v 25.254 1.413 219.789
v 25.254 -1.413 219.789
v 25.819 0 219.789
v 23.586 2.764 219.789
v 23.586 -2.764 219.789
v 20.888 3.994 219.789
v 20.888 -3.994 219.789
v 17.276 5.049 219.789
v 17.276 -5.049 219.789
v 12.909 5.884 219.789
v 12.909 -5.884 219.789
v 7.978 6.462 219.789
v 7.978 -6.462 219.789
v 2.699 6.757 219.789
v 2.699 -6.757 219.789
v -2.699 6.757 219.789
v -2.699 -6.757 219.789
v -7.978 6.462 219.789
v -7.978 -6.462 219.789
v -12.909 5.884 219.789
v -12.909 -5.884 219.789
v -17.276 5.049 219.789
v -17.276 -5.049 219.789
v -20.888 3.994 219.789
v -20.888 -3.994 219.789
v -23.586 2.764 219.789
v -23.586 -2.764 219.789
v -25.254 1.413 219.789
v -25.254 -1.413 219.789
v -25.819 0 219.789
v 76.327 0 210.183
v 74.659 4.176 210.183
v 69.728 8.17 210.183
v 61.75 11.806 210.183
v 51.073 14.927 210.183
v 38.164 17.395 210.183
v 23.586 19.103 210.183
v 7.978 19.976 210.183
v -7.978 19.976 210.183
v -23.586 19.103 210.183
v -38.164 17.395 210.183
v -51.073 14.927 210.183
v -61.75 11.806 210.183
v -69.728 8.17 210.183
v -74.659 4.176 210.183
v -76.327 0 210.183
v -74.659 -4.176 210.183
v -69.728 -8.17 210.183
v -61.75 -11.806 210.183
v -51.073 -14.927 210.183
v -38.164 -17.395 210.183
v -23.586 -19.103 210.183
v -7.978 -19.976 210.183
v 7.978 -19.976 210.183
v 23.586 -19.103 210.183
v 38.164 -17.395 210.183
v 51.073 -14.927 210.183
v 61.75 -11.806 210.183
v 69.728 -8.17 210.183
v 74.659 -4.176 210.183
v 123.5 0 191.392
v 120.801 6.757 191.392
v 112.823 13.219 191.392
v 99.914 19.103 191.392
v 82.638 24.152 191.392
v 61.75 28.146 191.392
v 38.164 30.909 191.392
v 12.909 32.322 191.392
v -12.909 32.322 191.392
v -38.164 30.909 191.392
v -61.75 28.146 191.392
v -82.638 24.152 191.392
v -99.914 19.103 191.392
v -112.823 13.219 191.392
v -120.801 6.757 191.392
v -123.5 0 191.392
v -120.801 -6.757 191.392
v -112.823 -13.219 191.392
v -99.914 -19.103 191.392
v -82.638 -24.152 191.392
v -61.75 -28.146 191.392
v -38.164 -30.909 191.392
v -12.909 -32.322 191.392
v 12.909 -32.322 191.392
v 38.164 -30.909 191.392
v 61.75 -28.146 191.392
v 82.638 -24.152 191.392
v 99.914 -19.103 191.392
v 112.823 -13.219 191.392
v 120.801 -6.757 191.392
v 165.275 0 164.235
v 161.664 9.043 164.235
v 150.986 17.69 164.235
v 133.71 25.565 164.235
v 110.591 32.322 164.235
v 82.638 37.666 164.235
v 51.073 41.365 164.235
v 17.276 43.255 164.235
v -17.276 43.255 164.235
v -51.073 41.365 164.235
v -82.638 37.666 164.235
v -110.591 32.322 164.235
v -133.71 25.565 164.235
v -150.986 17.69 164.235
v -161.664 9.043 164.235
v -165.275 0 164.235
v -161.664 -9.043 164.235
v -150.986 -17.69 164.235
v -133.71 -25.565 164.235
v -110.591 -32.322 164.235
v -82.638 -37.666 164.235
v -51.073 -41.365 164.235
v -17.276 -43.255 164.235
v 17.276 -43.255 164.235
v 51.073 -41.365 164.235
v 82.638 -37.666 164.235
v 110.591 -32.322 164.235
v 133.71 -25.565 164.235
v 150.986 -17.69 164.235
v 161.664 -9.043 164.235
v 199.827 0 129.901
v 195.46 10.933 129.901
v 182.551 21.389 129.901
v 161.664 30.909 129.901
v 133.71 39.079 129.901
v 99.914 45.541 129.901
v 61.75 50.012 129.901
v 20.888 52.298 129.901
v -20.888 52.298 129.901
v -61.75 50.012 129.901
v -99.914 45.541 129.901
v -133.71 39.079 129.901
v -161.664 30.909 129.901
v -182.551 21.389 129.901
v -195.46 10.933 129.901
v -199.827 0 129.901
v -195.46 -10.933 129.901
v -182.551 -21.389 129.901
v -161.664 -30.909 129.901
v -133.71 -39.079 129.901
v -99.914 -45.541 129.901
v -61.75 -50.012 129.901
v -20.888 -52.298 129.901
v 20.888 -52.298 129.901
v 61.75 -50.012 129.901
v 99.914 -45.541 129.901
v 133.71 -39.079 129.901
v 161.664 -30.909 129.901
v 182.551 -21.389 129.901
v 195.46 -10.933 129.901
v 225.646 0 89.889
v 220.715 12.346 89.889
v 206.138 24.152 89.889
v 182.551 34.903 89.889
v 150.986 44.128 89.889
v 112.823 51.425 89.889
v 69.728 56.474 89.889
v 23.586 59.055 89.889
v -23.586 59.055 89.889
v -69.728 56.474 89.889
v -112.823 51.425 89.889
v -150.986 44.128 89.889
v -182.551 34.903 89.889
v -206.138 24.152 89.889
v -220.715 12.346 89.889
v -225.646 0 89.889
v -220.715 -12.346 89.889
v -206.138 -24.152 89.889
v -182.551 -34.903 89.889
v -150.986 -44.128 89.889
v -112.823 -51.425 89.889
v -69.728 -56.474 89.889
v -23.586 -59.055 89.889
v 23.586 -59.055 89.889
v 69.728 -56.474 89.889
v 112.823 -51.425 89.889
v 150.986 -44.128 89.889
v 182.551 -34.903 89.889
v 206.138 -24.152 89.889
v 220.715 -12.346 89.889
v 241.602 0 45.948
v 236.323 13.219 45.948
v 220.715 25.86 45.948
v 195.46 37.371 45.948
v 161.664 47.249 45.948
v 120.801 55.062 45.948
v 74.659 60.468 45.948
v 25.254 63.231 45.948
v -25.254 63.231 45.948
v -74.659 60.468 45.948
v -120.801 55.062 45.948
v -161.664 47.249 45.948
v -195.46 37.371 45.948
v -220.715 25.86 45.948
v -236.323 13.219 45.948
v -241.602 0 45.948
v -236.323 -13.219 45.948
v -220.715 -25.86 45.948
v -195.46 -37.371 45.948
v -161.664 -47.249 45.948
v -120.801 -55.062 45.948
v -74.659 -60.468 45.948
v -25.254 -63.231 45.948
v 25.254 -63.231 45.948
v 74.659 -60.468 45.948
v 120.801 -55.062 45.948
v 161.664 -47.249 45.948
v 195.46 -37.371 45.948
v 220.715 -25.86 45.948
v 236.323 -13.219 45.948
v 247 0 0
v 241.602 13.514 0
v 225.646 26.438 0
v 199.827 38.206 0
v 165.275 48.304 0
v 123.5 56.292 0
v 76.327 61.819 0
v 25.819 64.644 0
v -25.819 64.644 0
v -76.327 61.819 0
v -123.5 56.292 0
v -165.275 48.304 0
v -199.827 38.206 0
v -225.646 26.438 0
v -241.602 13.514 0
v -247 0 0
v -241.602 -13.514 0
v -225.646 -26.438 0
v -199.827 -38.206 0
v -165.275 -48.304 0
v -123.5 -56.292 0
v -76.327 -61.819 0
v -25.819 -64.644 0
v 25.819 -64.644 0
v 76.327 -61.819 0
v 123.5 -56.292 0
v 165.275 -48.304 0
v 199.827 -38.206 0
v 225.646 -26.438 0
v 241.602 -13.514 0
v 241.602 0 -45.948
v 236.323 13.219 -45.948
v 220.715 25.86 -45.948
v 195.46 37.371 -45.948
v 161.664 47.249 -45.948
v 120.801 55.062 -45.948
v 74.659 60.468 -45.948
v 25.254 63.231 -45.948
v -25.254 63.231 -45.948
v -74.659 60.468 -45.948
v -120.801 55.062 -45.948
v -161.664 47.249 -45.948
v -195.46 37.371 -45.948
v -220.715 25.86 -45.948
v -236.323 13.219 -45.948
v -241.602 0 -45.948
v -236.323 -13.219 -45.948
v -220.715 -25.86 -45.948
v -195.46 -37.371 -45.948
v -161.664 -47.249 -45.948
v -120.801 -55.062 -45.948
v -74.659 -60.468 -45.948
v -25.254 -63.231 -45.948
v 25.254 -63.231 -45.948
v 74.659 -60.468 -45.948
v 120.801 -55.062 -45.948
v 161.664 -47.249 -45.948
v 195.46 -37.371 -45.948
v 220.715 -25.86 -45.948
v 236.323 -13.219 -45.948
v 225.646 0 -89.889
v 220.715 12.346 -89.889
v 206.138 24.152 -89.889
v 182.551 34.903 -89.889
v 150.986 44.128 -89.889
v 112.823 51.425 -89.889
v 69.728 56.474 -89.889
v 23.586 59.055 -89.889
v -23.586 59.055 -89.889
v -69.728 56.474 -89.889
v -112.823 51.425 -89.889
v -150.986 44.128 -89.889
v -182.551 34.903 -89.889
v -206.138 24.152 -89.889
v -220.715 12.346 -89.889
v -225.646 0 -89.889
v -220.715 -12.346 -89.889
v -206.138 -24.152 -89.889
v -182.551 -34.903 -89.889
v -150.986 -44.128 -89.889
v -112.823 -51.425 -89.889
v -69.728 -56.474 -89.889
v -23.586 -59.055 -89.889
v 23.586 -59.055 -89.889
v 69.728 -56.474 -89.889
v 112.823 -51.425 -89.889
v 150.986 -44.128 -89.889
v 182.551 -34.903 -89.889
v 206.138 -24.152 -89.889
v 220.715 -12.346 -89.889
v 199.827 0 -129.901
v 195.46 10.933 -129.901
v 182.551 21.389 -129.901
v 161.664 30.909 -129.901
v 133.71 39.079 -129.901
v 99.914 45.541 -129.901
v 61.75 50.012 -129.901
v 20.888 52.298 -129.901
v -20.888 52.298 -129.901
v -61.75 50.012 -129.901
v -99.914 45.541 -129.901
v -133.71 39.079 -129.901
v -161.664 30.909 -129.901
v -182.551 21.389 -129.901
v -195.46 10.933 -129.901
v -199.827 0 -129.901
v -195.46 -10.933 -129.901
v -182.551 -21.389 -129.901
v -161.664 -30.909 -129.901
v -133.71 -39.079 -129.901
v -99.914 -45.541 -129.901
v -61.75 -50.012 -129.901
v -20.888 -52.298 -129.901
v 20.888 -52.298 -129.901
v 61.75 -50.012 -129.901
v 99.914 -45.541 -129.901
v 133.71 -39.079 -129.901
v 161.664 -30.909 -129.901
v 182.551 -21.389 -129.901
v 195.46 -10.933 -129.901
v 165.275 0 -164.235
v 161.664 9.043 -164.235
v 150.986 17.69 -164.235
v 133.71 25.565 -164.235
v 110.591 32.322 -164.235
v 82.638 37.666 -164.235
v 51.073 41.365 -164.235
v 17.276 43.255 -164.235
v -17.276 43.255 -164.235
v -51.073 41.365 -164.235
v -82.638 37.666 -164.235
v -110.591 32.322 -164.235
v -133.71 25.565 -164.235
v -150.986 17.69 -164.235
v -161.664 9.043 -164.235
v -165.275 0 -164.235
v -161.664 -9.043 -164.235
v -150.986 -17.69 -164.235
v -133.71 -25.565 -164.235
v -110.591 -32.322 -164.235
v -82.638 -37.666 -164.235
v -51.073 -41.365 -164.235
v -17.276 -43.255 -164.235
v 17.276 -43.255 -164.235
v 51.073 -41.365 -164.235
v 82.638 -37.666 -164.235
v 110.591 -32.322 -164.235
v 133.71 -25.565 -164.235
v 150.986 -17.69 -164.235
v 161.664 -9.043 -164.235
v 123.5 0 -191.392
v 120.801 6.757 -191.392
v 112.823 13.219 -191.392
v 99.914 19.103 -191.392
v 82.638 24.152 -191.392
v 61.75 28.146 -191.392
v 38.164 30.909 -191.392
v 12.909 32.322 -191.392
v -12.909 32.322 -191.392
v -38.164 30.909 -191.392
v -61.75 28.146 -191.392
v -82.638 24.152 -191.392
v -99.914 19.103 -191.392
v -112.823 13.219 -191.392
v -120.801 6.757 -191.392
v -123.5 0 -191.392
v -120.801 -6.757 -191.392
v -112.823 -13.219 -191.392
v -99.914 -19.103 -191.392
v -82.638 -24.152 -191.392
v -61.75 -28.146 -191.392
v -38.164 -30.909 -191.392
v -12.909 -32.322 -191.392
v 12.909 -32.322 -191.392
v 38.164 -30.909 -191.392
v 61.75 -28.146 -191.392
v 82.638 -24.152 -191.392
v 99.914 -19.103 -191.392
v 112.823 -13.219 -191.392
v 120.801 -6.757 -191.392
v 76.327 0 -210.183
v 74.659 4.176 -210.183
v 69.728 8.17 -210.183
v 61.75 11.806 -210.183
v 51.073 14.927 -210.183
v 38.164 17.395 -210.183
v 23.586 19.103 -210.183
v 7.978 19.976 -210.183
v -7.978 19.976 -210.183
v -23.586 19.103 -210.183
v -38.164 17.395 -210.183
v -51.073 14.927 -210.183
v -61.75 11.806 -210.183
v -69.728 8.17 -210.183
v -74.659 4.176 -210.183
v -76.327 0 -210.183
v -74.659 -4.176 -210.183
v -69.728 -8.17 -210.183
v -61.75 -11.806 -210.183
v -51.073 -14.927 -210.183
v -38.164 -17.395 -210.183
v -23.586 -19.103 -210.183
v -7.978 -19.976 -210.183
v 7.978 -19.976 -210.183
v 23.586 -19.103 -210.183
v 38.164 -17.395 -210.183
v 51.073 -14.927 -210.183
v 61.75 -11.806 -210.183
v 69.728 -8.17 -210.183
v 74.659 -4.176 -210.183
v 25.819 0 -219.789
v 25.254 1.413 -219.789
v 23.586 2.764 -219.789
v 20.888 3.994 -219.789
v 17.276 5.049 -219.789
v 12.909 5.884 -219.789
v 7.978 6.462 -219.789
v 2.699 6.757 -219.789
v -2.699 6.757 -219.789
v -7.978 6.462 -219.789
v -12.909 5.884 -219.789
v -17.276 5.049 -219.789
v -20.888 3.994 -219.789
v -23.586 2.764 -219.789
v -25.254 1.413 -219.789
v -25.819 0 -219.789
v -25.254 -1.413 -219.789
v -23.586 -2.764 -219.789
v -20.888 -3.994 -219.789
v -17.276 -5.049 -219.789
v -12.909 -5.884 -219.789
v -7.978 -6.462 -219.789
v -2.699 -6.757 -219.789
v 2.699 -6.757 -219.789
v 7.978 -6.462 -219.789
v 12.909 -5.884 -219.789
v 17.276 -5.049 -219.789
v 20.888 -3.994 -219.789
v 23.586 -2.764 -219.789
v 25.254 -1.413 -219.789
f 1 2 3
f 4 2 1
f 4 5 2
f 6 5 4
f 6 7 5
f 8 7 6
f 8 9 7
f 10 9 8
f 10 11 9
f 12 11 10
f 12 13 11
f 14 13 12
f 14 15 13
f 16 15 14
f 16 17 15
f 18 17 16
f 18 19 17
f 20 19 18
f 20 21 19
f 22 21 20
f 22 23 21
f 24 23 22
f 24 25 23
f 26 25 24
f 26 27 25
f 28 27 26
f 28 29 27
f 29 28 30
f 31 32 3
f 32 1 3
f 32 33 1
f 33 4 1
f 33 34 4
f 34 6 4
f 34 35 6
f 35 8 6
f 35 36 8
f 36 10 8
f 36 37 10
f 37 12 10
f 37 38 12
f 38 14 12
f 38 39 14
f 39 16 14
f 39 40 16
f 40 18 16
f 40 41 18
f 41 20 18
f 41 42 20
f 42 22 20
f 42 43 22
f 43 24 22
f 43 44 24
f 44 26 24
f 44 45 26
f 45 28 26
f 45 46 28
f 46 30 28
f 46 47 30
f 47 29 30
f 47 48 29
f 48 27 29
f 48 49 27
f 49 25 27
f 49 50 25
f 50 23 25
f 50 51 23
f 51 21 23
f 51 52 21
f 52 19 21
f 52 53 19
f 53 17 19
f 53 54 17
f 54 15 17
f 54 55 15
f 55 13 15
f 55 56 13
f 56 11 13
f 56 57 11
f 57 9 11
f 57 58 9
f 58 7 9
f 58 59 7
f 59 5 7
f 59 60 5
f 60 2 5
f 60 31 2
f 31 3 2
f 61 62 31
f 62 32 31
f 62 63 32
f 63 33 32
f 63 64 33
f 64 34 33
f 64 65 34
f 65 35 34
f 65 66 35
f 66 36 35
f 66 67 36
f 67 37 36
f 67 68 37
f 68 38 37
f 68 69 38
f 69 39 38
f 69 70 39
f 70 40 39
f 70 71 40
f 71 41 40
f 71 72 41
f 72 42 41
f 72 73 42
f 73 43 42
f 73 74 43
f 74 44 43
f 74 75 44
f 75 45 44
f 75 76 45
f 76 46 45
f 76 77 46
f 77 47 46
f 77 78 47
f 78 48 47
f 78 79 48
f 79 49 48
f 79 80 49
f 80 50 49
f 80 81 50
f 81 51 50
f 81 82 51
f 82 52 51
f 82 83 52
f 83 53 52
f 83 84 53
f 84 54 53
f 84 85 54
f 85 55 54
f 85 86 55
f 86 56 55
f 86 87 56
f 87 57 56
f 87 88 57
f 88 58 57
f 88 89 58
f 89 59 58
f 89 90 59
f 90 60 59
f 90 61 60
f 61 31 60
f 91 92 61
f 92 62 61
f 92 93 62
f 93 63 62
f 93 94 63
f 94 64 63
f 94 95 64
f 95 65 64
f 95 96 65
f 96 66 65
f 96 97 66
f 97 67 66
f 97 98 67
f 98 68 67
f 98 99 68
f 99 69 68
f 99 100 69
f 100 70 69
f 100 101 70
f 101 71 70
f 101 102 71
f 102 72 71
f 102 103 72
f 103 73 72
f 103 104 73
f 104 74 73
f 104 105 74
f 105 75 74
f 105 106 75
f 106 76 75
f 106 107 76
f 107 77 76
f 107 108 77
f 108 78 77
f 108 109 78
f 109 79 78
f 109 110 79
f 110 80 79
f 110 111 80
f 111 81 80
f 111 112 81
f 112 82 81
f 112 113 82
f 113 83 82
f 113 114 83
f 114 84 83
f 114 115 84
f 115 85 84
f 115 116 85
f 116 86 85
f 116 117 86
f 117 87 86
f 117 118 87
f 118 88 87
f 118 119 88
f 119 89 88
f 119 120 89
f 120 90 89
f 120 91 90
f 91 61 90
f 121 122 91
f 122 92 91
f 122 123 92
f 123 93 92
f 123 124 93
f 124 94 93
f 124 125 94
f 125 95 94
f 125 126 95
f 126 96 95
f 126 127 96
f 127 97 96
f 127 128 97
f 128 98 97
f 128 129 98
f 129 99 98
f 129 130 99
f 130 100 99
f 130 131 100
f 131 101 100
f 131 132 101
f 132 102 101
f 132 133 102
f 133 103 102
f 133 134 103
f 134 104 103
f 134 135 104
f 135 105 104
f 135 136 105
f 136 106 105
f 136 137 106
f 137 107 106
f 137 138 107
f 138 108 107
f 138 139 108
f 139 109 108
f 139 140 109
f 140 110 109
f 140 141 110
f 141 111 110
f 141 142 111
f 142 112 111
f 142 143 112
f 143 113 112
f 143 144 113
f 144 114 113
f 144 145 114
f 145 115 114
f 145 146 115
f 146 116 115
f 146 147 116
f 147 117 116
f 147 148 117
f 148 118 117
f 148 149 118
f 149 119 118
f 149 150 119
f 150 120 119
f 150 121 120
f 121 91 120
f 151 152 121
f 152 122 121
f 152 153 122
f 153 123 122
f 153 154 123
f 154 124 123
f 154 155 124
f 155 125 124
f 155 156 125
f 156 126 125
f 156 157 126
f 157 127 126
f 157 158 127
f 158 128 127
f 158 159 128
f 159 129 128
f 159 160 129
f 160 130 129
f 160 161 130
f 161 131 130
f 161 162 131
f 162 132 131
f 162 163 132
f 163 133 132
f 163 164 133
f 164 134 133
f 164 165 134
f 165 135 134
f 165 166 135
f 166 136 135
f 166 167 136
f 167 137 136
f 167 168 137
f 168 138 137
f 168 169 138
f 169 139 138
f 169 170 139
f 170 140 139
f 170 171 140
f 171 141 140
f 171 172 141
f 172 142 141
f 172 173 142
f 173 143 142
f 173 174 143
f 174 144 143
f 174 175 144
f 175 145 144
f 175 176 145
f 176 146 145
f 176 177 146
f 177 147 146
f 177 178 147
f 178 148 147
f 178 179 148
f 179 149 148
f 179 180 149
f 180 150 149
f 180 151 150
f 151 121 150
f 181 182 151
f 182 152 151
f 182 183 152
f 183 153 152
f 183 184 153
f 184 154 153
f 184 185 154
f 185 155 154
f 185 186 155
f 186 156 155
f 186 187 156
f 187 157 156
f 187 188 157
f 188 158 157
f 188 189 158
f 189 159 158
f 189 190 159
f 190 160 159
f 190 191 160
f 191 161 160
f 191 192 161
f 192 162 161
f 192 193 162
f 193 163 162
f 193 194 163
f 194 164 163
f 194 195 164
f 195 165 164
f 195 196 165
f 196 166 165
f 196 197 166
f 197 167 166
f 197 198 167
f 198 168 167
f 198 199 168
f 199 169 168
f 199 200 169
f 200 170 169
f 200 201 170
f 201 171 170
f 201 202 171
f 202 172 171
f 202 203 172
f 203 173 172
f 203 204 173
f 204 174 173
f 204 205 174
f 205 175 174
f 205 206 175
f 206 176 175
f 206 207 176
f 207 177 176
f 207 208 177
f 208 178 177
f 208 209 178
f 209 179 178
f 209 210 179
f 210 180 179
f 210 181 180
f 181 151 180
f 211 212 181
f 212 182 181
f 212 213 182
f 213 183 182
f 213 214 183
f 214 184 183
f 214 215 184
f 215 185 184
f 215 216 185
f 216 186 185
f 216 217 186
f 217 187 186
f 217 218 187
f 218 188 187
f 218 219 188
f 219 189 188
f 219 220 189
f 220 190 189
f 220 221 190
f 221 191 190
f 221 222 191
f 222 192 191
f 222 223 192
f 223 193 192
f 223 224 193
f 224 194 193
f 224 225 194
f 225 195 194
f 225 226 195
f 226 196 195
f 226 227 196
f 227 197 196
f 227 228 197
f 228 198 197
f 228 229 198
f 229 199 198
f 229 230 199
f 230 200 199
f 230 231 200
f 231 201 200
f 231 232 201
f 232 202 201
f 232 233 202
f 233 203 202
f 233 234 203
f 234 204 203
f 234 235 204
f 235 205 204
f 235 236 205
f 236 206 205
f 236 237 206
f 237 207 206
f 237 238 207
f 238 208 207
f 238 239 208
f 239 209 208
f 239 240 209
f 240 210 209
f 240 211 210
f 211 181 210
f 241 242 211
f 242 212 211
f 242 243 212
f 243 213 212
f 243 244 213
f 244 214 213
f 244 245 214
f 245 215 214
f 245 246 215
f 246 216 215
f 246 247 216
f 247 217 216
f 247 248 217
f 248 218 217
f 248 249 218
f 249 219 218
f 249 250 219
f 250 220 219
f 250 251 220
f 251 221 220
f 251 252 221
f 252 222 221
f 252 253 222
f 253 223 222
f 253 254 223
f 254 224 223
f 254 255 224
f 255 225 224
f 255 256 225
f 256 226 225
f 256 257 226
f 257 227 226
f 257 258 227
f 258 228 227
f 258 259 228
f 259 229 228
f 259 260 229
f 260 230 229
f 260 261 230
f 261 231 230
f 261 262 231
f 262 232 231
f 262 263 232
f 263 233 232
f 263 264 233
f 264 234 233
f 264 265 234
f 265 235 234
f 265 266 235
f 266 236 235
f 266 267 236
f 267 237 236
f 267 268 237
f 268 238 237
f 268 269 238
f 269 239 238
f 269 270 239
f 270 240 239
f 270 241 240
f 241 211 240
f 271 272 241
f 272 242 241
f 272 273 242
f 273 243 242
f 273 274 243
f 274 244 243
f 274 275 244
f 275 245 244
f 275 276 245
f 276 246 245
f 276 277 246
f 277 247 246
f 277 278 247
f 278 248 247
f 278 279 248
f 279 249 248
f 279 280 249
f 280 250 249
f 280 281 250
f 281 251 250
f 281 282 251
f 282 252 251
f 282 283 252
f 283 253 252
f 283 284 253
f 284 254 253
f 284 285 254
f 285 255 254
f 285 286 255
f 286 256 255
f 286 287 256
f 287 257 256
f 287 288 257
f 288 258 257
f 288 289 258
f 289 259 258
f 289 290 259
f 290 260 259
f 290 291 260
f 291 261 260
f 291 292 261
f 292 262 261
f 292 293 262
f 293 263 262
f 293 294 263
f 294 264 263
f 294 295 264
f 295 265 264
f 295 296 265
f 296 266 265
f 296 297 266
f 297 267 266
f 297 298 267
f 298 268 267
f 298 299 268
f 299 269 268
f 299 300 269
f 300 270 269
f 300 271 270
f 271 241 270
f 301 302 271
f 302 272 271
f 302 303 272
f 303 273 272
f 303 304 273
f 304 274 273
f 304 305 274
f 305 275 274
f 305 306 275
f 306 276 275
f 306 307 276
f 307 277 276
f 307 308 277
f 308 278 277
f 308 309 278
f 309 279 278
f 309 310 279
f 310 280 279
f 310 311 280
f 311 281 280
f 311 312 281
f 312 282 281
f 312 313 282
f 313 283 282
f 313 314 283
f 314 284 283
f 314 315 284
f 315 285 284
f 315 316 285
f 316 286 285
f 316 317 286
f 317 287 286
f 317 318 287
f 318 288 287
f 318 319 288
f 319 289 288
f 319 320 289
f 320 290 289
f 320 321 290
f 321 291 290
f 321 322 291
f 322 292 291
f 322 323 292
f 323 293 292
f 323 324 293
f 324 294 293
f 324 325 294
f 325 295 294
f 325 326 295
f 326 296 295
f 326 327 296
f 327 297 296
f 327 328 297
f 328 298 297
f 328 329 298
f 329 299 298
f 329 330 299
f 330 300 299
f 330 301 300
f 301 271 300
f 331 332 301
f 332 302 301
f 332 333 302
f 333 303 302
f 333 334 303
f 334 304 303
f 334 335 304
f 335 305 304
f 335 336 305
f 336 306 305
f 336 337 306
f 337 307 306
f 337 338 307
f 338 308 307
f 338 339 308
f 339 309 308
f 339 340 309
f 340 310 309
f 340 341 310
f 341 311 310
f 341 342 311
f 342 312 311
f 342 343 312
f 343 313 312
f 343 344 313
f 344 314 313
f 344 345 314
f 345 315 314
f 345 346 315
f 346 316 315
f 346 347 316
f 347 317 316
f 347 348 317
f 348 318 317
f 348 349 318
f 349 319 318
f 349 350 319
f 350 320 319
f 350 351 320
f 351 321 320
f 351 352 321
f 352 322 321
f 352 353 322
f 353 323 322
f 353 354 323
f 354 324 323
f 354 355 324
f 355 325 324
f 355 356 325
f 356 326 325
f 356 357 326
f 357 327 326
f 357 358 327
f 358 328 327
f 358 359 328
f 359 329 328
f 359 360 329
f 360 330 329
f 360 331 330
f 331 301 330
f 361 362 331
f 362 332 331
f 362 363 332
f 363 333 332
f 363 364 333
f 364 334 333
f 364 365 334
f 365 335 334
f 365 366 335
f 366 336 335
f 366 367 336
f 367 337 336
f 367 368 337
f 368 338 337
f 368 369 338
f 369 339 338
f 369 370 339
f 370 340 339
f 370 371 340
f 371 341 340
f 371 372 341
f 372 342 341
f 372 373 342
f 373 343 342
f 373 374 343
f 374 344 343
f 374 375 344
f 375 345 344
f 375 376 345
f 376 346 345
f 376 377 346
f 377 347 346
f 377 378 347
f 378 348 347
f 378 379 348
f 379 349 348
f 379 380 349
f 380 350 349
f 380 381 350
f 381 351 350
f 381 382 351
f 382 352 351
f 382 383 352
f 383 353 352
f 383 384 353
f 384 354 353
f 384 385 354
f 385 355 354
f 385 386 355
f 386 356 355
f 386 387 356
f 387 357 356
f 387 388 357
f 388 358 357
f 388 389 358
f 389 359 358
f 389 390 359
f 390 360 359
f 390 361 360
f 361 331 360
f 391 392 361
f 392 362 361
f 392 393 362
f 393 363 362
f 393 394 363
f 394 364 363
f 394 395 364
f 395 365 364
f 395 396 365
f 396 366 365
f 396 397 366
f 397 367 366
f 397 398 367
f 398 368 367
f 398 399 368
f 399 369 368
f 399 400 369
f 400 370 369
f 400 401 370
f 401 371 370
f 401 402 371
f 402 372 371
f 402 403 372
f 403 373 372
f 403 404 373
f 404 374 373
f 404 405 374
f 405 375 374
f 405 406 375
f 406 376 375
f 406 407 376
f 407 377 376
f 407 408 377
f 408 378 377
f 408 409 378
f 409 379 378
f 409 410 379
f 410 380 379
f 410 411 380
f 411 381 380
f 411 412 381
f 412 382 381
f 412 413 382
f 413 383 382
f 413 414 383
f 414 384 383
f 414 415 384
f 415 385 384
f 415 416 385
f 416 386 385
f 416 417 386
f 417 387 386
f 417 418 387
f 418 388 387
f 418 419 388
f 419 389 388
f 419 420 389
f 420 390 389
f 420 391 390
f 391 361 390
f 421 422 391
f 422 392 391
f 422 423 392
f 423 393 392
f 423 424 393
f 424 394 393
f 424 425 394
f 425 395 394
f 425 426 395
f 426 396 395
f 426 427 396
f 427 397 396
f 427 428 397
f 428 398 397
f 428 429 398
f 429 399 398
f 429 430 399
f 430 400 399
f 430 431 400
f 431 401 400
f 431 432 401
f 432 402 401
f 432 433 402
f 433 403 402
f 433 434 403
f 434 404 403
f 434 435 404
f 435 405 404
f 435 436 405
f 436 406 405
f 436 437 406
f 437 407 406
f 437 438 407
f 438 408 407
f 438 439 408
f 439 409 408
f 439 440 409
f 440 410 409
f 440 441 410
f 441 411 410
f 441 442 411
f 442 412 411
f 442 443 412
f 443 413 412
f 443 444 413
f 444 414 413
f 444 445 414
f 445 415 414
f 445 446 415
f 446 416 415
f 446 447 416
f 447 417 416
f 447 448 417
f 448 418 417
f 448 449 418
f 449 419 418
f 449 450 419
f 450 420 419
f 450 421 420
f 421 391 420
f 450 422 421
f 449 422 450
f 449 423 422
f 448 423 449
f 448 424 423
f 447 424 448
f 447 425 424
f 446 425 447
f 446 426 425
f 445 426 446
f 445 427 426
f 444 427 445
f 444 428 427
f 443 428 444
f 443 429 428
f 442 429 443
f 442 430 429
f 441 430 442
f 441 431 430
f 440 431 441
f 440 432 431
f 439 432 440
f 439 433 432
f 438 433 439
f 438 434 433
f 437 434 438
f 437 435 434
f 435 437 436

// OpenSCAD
// Generated by SolidPython 1.0.1 on 2020-07-29 00:46:53


scale(v = [19, 5, 17]) {
	sphere(r = 13);
}
/***********************************************
*********      SolidPython code:      **********
************************************************
 
# import packages: SolidPython
from solid import *
from solid.utils import *
from itertools import chain, combinations, permutations


class Resize:

    def __init__(self, scad_file):
        self.scad_file = scad_file
        #self.scad_file = import_scad(scad_file)
        # cone/cylinder param:
        self.r1 = 0
        self.r2 = 0
        self.h = 0
        # rectangular prism param:
        self.w = 0
        self.l = 0
        # ellipse param:
        self.r = 0

    # import OpenScad code (file name corresponds to shape)


    # classify shape + parameters
    def assign(self, param1, param2, param3):
        if self.scad_file == 'cone.scad':
            self.r1 = param1
            self.r2 = param2
            self.h = param3
        elif self.scad_file == 'cylinder.scad':
            self.r1 = param1
            self.r2 = param2
            self.h = param3
        elif self.scad_file == 'rectangularPrism.scad':
            self.h = param1
            self.l = param2
            self.w = param3
        else:
            self.r = param1
            self.h = param2

    # resize parameters
    def iterate(self):
        x = range(3, 20, 2)
        i = 1
        if self.scad_file == 'cone.scad':
            tempList = list(permutations(x, 2))
            for temp in tempList:
                param1 = temp[0]
                param2 = temp[1]
                filepath = 'produced_scad_files/' + 'cone' + str(param1) + '_' + str(param2) + '_' + '.scad'
                scad_render_to_file(cylinder(h=param1, r1=param2, r2=0), filepath)

        elif self.scad_file == 'cylinder.scad':
            tempList = list(permutations(x, 3))
            for temp in tempList:
                param1 = temp[0]
                param2 = temp[1]
                filepath = 'produced_scad_files/' + 'cylinder' + str(param1) + '_' + str(param2) + '_' + '.scad'
                scad_render_to_file(cylinder(h=param1, r1=param2, r2=param2), filepath)

        elif self.scad_file == 'rectangularPrism.scad':
            tempList = list(permutations(x, 3))
            for temp in tempList:
                param1 = temp[0]
                param2 = temp[1]
                param3 = temp[2]
                filepath = 'produced_scad_files/' + 'rectangularPrism' + str(param1) + '_' + str(param2) + '_' + str(
                    param3) + '.scad'
                scad_render_to_file(cube(size=(param1, param2, param3)), filepath)

        elif self.scad_file == 'ellipse.scad':
            tempList = list(permutations(x, 4))
            for temp in tempList:
                param1 = temp[0]
                param2 = temp[1]
                param3 = temp[2]
                param4 = temp[3]
                filepath = 'produced_scad_files/' + 'ellipse' + str(param1) + '_' + str(param2) + '_' + str(param3) + '_' + str(param4) + '.scad'
                scad_render_to_file(scale([param1, param2, param3])(sphere(r=param4)), filepath)

    def render_to_scadfile(self):
        scad_render_to_file(scad, 'example.scad') 
 
************************************************/
